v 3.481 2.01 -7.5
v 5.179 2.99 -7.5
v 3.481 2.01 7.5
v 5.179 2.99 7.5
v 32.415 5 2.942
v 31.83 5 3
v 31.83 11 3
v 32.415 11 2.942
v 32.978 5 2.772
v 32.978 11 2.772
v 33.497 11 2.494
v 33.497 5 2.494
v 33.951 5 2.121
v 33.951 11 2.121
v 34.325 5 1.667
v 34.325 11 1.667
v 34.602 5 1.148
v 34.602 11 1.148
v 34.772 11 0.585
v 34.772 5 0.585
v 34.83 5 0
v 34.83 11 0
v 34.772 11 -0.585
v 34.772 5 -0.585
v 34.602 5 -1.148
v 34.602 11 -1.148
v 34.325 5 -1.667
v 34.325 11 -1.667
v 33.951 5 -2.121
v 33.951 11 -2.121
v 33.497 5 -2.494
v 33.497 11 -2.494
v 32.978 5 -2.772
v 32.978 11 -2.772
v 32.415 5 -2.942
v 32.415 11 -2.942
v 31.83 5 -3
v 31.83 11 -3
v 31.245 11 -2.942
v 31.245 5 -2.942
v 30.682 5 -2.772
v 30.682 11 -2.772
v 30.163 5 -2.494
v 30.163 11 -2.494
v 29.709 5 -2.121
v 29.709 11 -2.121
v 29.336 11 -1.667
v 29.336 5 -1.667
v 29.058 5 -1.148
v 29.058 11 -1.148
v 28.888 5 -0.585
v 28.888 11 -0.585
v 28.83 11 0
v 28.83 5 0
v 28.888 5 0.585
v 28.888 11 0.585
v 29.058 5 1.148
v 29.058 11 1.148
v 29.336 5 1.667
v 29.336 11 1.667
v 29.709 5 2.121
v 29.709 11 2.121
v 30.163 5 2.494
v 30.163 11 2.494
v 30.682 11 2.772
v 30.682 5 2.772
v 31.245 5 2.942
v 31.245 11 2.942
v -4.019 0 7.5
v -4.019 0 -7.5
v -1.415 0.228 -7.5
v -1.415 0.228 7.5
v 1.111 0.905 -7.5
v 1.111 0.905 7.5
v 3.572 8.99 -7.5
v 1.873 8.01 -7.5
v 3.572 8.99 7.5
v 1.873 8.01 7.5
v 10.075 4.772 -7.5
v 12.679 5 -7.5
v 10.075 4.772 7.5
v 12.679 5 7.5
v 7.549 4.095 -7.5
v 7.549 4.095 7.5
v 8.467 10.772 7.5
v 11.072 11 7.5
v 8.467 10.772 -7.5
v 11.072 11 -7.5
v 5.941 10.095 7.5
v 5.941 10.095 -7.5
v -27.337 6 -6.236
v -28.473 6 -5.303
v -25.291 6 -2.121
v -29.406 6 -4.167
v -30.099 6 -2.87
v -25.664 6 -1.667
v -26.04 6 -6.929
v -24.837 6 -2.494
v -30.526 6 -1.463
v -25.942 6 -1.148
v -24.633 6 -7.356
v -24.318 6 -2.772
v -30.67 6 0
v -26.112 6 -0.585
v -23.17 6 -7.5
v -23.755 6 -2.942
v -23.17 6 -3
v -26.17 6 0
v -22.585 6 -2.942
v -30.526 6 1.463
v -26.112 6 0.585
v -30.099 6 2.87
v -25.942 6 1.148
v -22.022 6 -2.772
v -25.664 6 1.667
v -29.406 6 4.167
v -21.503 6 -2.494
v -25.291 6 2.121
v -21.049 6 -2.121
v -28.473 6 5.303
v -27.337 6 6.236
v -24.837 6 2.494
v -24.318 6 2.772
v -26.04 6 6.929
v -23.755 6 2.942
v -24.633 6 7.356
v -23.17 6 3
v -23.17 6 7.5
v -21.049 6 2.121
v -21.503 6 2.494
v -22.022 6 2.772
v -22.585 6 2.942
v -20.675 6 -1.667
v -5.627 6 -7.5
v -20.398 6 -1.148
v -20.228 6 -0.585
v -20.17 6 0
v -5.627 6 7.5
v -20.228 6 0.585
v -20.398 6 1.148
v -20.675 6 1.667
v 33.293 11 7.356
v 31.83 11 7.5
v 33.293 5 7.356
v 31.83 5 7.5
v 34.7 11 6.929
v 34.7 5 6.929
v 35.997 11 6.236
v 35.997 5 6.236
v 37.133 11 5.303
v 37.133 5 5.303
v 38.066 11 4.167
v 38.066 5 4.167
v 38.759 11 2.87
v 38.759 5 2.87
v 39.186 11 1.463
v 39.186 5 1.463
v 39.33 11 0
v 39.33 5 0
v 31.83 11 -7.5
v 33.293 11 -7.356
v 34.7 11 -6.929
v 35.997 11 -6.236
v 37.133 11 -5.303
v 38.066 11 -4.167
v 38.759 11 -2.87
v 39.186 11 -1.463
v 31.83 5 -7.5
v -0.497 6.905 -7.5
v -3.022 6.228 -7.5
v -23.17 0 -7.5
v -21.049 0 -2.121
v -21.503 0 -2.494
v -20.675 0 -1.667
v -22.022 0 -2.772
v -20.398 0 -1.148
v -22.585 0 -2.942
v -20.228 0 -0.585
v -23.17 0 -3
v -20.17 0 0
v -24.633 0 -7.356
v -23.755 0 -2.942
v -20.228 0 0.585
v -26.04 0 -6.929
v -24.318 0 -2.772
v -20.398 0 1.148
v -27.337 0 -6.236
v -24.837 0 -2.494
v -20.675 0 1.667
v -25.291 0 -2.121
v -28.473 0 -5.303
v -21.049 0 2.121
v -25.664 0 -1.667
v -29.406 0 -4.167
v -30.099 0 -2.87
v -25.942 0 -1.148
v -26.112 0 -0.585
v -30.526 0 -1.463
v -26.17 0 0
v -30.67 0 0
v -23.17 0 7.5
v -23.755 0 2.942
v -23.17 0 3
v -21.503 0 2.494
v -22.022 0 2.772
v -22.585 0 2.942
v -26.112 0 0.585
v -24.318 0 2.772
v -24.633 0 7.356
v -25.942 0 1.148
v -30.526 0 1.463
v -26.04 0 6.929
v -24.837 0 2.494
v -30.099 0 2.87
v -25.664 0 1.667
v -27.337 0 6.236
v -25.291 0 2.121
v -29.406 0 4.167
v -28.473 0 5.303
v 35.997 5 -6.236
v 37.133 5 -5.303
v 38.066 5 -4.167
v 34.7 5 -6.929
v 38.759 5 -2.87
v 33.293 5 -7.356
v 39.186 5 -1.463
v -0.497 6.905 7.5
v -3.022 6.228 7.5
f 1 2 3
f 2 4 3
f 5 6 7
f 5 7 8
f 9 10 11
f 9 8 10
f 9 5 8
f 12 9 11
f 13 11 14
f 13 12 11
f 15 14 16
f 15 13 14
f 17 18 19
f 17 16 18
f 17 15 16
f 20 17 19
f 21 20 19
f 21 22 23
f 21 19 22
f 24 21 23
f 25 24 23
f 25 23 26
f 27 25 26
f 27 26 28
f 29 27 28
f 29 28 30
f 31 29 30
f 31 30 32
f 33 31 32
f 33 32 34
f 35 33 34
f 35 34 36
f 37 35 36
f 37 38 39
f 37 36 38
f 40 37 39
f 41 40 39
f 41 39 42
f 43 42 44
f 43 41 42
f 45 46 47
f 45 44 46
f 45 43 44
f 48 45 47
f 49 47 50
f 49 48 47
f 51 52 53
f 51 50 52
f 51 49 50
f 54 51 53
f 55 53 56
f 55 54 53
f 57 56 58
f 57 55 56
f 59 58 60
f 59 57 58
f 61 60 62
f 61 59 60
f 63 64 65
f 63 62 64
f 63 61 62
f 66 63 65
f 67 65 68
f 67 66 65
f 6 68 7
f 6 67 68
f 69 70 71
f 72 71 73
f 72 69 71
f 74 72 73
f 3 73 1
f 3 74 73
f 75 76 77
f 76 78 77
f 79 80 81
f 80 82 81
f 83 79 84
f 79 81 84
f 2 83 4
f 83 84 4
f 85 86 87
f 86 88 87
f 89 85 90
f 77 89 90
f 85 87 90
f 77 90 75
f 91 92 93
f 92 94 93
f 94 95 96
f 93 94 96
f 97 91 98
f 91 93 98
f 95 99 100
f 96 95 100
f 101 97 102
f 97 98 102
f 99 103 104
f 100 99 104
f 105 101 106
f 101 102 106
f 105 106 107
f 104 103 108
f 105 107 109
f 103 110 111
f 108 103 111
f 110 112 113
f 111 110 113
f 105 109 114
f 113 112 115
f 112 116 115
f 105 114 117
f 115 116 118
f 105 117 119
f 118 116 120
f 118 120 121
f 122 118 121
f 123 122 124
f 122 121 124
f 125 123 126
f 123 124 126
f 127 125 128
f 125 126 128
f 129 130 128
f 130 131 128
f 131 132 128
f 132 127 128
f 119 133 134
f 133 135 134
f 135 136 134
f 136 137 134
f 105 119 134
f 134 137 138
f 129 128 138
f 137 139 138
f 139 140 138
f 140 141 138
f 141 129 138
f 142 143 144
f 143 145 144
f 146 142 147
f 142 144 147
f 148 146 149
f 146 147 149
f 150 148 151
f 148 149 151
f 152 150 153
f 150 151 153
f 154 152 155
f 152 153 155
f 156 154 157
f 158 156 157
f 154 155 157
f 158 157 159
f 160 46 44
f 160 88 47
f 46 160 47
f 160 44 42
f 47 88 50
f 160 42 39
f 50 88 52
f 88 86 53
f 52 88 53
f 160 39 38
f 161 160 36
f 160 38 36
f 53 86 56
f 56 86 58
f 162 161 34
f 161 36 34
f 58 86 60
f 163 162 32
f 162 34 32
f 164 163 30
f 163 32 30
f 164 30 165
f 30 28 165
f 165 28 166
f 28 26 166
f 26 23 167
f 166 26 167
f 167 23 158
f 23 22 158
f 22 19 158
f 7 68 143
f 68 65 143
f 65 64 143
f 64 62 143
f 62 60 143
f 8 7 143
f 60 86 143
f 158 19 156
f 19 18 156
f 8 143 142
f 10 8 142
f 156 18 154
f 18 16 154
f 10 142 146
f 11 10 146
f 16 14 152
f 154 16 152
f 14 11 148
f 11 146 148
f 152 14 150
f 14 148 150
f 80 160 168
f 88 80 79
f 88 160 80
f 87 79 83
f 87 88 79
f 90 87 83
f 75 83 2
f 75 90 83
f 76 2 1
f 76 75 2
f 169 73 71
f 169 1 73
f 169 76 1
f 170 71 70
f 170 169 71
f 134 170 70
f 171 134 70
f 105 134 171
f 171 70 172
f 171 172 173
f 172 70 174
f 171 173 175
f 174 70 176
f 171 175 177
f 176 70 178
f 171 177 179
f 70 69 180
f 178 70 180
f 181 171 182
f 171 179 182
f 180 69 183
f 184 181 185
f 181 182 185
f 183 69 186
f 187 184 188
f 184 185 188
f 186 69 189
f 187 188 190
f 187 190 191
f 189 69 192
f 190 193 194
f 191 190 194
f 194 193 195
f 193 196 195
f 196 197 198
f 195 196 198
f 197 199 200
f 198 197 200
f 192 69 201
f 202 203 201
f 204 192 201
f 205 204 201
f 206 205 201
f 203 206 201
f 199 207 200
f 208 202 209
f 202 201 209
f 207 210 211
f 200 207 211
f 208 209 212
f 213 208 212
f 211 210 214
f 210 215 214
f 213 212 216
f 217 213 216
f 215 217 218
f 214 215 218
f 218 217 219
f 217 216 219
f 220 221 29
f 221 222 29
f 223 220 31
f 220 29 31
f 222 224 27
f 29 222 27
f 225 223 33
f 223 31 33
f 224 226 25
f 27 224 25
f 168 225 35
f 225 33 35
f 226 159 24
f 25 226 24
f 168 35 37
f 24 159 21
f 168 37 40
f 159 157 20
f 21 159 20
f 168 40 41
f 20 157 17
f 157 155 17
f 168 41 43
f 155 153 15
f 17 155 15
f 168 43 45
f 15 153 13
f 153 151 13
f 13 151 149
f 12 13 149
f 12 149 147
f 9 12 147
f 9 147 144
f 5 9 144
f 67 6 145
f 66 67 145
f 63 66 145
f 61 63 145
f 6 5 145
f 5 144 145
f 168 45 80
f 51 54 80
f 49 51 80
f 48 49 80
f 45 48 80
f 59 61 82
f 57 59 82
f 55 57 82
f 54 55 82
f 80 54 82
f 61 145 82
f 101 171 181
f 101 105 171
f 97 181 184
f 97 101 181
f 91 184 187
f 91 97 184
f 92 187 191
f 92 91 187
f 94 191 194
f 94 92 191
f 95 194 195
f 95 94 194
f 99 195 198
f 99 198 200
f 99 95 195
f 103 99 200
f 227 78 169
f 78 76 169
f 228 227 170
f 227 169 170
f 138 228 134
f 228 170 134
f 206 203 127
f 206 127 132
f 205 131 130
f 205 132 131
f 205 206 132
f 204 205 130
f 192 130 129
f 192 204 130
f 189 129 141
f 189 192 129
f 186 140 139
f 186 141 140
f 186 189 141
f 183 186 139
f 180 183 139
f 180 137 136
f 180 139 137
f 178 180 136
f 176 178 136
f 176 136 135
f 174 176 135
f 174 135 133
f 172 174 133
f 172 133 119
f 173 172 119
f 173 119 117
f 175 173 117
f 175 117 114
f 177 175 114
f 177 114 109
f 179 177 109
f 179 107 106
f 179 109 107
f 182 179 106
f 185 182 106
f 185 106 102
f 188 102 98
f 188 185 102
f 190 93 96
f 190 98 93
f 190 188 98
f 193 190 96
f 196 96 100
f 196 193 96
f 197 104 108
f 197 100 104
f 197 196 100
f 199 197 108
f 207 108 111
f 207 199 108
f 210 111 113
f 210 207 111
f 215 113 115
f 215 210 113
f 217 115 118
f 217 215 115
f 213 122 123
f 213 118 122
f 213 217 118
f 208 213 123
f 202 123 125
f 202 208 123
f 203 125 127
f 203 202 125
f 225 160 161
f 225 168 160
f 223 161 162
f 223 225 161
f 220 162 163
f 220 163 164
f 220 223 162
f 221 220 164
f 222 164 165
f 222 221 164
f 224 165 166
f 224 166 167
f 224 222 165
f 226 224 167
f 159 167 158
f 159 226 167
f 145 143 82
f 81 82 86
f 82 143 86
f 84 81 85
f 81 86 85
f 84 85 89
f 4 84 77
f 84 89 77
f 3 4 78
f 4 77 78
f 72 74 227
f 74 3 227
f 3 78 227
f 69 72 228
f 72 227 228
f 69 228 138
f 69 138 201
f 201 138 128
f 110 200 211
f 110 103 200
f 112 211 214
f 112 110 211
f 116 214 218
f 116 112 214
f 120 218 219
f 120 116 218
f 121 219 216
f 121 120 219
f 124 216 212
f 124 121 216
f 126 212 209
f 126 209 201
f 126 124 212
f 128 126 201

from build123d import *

# Parameters (mm, degrees)
SALIENTE_EXTRUIR1_DEPTH    = 7.5
REDONDEO1_R                = 15
REDONDEO2_R                = 7.5
CORTAR_EXTRUIR1_DEPTH      = 41.485909788
CORTAR_EXTRUIR1_DEPTH_BACK = 41.485909788
CROQUIS2_R                 = 3


with BuildPart() as part:
    # Croquis1 → Saliente-Extruir1 (new, symmetric)
    with BuildSketch(Plane.XY):
        Polygon((0, 0), (-30.669872981, 0), (-30.669872981, 6), (-1.607695155, 6), (7.052558883, 11), (39.330127019, 11), (39.330127019, 5), (8.660254038, 5), align=None)
    extrude(amount=SALIENTE_EXTRUIR1_DEPTH, both=True)

    # Redondeo1
    redondeo1_edges = [part.edges().sort_by_distance(p)[0] for p in [
        (0, 0, 0),
        (-1.607695155, 6, 0),
        (7.052558883, 11, 0),
        (8.660254038, 5, 0),
    ]]
    fillet(redondeo1_edges, radius=REDONDEO1_R)

    # Redondeo2
    redondeo2_edges = [part.edges().sort_by_distance(p)[0] for p in [
        (-30.669872981, 3, -7.5),
        (-30.669872981, 3, 7.5),
        (39.330127019, 8, -7.5),
        (39.330127019, 8, 7.5),
    ]]
    fillet(redondeo2_edges, radius=REDONDEO2_R - 0.0001)  # a hair under: the kernel refuses the full size

    # Croquis2 → Cortar-Extruir1 (cut, two sides: drawn at the far end of the back side and taken through both)
    with BuildSketch(Plane(origin=(0, 6, 0), x_dir=(1, 0, 0), z_dir=(0, 1, 0)).offset(-CORTAR_EXTRUIR1_DEPTH_BACK)):
        with Locations(Location((-23.169872981, 0, 0), (0, 0, 270))):
            Circle(CROQUIS2_R)
        with Locations(Location((31.830127019, 0, 0), (0, 0, 270))):
            Circle(CROQUIS2_R)
    extrude(amount=CORTAR_EXTRUIR1_DEPTH + CORTAR_EXTRUIR1_DEPTH_BACK, mode=Mode.SUBTRACT)


solid = part.part
